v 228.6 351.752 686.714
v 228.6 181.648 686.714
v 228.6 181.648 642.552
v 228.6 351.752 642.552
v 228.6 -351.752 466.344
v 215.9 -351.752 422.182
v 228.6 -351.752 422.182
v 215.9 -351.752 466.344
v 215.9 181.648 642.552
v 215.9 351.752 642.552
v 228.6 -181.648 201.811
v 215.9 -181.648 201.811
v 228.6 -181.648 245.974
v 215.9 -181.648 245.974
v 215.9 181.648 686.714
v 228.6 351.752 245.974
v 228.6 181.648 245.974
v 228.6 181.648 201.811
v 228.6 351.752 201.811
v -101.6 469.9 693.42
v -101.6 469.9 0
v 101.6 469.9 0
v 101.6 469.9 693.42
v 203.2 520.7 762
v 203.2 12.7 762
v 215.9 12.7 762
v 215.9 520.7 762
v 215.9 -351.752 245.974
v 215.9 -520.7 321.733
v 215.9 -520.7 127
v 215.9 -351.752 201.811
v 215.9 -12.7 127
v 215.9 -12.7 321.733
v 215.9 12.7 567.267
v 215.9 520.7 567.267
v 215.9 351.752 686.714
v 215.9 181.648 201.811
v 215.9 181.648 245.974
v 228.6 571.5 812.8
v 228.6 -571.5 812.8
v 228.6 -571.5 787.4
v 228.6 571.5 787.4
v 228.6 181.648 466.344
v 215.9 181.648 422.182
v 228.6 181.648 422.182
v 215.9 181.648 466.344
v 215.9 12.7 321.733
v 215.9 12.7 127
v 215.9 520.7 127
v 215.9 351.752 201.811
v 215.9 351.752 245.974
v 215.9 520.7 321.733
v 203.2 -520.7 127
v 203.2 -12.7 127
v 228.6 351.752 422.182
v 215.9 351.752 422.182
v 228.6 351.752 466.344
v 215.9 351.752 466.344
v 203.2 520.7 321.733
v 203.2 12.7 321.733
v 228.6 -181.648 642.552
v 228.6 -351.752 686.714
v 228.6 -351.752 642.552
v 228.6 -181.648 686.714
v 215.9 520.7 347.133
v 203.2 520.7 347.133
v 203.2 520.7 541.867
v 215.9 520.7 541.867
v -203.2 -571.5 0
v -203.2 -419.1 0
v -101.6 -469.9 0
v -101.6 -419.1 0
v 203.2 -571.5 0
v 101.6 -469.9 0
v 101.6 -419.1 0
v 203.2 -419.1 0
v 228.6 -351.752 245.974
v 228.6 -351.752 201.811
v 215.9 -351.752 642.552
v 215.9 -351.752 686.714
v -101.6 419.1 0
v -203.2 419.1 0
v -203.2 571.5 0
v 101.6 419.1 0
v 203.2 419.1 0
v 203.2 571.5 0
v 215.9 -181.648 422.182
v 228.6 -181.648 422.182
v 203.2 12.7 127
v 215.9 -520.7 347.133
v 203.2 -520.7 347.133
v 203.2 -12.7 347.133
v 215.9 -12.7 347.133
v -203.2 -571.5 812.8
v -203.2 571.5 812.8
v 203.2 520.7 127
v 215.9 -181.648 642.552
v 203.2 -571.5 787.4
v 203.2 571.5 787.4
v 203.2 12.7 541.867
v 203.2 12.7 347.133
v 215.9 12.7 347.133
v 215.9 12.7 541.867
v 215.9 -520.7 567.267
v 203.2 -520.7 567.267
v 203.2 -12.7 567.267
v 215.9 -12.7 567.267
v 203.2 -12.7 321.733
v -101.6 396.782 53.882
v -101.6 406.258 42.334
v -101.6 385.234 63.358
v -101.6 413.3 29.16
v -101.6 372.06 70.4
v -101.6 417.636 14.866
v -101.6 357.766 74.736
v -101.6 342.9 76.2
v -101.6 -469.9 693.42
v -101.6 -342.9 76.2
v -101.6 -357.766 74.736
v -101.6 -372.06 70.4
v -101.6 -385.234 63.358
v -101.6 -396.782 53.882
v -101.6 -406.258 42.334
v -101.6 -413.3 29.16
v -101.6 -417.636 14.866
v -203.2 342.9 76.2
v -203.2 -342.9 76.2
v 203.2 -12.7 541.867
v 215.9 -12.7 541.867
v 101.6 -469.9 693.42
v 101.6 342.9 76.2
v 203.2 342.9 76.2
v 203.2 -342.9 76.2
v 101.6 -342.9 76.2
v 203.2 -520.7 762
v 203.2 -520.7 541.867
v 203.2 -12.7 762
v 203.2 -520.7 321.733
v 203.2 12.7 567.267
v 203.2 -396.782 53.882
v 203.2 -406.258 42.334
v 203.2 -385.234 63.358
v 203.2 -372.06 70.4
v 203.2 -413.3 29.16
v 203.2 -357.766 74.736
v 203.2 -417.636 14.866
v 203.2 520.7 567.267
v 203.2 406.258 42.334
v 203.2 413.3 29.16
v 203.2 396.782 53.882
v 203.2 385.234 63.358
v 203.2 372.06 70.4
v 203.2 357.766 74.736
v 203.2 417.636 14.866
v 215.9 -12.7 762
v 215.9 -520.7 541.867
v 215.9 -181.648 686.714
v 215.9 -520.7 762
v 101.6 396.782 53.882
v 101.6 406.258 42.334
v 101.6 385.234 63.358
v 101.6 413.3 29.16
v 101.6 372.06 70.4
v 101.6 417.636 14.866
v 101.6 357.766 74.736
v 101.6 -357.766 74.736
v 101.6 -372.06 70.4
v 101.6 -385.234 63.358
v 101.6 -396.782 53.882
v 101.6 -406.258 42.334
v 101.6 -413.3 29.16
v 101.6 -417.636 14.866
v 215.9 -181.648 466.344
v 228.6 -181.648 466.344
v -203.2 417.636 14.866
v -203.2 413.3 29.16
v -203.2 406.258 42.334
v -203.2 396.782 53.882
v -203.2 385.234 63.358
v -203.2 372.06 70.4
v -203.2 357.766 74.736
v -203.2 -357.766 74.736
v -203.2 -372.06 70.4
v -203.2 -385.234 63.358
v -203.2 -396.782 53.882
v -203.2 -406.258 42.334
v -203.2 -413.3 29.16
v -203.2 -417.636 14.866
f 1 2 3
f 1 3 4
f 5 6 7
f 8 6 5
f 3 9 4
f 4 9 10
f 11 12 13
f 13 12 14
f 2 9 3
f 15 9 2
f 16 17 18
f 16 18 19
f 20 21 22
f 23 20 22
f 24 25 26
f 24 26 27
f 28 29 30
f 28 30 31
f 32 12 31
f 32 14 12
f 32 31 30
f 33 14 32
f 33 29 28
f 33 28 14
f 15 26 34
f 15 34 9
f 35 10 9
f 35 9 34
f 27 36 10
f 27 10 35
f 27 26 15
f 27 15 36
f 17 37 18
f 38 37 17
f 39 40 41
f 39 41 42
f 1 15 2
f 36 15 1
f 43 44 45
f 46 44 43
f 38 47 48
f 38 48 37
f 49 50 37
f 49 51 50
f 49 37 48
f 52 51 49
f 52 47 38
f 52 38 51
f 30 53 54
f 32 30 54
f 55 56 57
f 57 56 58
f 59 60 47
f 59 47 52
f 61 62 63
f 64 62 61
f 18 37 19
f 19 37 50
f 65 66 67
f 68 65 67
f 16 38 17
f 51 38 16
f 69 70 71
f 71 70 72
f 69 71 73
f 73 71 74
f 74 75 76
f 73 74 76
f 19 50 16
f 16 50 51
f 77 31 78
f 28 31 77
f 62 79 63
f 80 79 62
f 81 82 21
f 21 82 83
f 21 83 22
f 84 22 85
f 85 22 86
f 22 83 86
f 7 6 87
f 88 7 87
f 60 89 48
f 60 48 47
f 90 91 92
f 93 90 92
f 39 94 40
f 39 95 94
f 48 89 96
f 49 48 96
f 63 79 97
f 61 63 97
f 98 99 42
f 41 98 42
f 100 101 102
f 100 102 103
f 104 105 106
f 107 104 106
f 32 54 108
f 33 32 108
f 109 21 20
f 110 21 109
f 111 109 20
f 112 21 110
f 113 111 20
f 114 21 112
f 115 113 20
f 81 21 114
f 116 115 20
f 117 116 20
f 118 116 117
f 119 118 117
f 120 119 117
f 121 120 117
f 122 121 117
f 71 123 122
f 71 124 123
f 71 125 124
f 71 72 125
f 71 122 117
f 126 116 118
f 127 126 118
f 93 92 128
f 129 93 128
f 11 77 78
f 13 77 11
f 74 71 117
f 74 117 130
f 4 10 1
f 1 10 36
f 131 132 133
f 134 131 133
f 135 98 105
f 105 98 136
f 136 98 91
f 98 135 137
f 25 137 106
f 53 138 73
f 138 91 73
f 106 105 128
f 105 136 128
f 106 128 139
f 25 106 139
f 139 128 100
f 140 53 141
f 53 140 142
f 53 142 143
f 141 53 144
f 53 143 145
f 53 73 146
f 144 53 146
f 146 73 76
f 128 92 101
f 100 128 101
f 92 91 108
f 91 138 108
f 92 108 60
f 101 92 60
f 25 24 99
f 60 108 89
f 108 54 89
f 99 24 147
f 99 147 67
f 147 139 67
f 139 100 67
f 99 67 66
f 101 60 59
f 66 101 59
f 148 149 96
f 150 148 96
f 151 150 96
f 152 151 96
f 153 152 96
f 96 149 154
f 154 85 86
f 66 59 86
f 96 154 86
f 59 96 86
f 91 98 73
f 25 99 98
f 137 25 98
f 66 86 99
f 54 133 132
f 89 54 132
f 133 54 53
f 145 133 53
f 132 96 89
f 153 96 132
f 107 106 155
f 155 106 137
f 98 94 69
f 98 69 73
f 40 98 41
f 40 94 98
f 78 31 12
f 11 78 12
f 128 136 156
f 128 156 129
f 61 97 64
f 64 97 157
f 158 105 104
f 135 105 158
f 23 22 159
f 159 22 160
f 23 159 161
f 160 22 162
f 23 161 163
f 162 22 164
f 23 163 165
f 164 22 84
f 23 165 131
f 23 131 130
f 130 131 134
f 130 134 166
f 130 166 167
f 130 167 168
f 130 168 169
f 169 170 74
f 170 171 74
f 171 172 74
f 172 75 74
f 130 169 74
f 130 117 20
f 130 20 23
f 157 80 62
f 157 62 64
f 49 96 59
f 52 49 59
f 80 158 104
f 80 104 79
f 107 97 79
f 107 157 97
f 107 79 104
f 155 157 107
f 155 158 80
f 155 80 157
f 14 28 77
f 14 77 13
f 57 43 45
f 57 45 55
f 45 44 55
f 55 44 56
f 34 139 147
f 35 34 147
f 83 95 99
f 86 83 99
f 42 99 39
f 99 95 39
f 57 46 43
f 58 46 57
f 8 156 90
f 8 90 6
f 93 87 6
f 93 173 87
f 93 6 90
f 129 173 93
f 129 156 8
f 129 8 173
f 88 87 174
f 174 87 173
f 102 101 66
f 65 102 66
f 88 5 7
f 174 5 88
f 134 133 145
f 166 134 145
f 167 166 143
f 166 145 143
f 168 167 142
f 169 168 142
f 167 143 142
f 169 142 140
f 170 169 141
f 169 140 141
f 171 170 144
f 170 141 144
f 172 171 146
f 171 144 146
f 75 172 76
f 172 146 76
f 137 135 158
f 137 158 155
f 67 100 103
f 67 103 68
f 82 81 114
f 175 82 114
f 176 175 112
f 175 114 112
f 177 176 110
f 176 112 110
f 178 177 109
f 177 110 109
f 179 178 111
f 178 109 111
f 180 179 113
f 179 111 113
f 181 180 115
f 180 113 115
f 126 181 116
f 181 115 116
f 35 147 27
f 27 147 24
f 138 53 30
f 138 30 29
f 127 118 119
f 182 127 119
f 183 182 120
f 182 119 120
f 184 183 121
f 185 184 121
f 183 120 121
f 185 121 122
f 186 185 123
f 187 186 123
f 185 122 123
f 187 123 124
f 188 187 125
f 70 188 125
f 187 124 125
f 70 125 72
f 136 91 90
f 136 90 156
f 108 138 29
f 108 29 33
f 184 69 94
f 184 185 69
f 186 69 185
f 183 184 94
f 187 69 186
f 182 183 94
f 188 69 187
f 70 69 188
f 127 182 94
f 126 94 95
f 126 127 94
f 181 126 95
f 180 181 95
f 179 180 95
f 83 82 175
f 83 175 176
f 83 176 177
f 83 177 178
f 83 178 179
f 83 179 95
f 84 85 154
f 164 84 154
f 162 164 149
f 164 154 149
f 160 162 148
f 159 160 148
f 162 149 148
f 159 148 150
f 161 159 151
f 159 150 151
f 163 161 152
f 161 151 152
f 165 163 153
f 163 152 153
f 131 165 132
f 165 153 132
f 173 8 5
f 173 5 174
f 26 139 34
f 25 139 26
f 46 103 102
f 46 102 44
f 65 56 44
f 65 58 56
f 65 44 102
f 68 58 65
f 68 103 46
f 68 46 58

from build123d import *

# Parameters (mm, degrees)
F0_W      = 406.4
F0_H      = 1143
F1_DEPTH  = 812.8
F2_W      = 25.4
F2_H      = 1143
F3_DEPTH  = 25.4
F4_W      = 508
F4_H      = 194.733333
F4_H_2    = 194.733334
F5_DEPTH  = 12.7
F6_DEPTH  = 406.401
F7_W      = 170.104802
F7_H      = 44.162155
F8_DEPTH  = 12.7
F9_W      = 203.2
F9_H      = 939.8
F10_DEPTH = 693.42


with BuildPart() as f1:
    # F0 (on Top) → F1 (new body)
    with BuildSketch(Plane.XY):
        Rectangle(F0_W, F0_H)
    extrude(amount=F1_DEPTH)

    # F2 (on face) → F3 (join)
    with BuildSketch(Plane.XY.offset(812.8)):
        with Locations((215.9, 0)):
            Rectangle(F2_W, F2_H)
    extrude(amount=-F3_DEPTH)

    # F4 (on face) → F5 (join)
    with BuildSketch(Plane.YZ.offset(203.2)):
        with Locations((-266.7, 664.633333)):
            Rectangle(F4_W, F4_H)
        with Locations((266.7, 664.633333)):
            Rectangle(F4_W, F4_H)
        with Locations((266.7, 444.5)):
            Rectangle(F4_W, F4_H_2)
        with Locations((-266.7, 444.5)):
            Rectangle(F4_W, F4_H_2)
        with Locations((-266.7, 224.366666)):
            Rectangle(F4_W, F4_H)
        with Locations((266.7, 224.366666)):
            Rectangle(F4_W, F4_H)
    extrude(amount=F5_DEPTH)

    # F4 (on face) → F6 (cut, through all)
    with BuildSketch(Plane.YZ.offset(203.2)):
        with BuildLine():
            Line((342.9, 76.2), (-342.9, 76.2))
            ThreePointArc((-342.9, 76.2), (-396.781537, 53.881537), (-419.1, 0))
            Line((-419.1, 0), (419.1, 0))
            ThreePointArc((419.1, 0), (396.781537, 53.881537), (342.9, 76.2))
        make_face()
    extrude(amount=-F6_DEPTH, mode=Mode.SUBTRACT)

    # F7 (on face) → F8 (join)
    with BuildSketch(Plane.YZ.offset(215.9)):
        with Locations((-266.7, 664.633333)):
            Rectangle(F7_W, F7_H)
        with Locations((266.7, 664.633333)):
            Rectangle(F7_W, F7_H)
        with Locations((266.7, 444.262933)):
            Rectangle(F7_W, F7_H)
        with Locations((266.7, 223.892533)):
            Rectangle(F7_W, F7_H)
        with Locations((-266.7, 223.892533)):
            Rectangle(F7_W, F7_H)
        with Locations((-266.7, 444.262933)):
            Rectangle(F7_W, F7_H)
    extrude(amount=F8_DEPTH)

    # F9 (on face) → F10 (cut)
    with BuildSketch(Plane(origin=(0, 0, 0), x_dir=(1, 0, 0), z_dir=(0, 0, -1))):
        Rectangle(F9_W, F9_H)
    extrude(amount=-F10_DEPTH, mode=Mode.SUBTRACT)


solid = f1.part
